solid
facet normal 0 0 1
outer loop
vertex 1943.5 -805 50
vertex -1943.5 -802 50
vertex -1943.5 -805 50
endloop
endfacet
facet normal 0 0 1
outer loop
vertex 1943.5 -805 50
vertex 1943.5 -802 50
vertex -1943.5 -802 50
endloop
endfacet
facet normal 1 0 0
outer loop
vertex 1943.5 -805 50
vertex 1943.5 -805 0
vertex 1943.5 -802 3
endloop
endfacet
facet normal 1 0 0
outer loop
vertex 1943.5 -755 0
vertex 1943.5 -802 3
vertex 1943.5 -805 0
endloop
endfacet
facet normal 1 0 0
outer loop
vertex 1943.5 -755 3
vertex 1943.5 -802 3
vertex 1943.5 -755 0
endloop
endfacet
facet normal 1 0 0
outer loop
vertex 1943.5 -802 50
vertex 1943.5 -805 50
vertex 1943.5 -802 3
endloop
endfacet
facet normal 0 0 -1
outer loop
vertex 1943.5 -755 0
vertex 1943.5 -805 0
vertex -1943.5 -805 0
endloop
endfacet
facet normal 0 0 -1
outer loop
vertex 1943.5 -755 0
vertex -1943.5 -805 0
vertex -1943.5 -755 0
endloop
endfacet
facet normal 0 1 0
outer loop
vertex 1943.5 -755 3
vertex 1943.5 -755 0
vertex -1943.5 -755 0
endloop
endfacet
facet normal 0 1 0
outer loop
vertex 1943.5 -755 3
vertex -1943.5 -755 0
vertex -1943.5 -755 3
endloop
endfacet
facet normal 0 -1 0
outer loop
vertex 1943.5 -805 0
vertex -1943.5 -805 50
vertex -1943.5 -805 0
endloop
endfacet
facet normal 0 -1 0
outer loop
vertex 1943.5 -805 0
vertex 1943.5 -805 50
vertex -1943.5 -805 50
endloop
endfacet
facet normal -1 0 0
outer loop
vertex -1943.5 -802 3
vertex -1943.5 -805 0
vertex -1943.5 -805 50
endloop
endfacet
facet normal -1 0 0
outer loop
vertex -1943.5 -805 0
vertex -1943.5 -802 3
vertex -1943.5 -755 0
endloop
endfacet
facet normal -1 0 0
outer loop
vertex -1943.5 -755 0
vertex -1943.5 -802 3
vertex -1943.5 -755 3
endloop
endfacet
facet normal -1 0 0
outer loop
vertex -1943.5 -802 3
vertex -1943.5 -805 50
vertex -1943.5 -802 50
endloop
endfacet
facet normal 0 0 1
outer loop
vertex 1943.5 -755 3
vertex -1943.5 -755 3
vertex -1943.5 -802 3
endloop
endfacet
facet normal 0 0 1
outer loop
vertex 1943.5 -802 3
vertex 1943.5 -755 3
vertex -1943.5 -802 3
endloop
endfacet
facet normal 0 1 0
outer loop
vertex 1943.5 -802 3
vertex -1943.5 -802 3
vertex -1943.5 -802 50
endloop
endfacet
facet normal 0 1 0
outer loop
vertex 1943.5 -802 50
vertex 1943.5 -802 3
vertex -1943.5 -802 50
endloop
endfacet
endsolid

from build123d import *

# Parameters (mm, degrees)
PAD_DEPTH = 1943.5


with BuildPart() as part:
    # Sketch → Pad (new body, symmetric)
    with BuildSketch(Plane.YZ):
        Polygon((-805, 50), (-805, 0), (-755, 0), (-755, 3), (-802, 3), (-802, 50), align=None)
    extrude(amount=PAD_DEPTH, both=True)


solid = part.part
